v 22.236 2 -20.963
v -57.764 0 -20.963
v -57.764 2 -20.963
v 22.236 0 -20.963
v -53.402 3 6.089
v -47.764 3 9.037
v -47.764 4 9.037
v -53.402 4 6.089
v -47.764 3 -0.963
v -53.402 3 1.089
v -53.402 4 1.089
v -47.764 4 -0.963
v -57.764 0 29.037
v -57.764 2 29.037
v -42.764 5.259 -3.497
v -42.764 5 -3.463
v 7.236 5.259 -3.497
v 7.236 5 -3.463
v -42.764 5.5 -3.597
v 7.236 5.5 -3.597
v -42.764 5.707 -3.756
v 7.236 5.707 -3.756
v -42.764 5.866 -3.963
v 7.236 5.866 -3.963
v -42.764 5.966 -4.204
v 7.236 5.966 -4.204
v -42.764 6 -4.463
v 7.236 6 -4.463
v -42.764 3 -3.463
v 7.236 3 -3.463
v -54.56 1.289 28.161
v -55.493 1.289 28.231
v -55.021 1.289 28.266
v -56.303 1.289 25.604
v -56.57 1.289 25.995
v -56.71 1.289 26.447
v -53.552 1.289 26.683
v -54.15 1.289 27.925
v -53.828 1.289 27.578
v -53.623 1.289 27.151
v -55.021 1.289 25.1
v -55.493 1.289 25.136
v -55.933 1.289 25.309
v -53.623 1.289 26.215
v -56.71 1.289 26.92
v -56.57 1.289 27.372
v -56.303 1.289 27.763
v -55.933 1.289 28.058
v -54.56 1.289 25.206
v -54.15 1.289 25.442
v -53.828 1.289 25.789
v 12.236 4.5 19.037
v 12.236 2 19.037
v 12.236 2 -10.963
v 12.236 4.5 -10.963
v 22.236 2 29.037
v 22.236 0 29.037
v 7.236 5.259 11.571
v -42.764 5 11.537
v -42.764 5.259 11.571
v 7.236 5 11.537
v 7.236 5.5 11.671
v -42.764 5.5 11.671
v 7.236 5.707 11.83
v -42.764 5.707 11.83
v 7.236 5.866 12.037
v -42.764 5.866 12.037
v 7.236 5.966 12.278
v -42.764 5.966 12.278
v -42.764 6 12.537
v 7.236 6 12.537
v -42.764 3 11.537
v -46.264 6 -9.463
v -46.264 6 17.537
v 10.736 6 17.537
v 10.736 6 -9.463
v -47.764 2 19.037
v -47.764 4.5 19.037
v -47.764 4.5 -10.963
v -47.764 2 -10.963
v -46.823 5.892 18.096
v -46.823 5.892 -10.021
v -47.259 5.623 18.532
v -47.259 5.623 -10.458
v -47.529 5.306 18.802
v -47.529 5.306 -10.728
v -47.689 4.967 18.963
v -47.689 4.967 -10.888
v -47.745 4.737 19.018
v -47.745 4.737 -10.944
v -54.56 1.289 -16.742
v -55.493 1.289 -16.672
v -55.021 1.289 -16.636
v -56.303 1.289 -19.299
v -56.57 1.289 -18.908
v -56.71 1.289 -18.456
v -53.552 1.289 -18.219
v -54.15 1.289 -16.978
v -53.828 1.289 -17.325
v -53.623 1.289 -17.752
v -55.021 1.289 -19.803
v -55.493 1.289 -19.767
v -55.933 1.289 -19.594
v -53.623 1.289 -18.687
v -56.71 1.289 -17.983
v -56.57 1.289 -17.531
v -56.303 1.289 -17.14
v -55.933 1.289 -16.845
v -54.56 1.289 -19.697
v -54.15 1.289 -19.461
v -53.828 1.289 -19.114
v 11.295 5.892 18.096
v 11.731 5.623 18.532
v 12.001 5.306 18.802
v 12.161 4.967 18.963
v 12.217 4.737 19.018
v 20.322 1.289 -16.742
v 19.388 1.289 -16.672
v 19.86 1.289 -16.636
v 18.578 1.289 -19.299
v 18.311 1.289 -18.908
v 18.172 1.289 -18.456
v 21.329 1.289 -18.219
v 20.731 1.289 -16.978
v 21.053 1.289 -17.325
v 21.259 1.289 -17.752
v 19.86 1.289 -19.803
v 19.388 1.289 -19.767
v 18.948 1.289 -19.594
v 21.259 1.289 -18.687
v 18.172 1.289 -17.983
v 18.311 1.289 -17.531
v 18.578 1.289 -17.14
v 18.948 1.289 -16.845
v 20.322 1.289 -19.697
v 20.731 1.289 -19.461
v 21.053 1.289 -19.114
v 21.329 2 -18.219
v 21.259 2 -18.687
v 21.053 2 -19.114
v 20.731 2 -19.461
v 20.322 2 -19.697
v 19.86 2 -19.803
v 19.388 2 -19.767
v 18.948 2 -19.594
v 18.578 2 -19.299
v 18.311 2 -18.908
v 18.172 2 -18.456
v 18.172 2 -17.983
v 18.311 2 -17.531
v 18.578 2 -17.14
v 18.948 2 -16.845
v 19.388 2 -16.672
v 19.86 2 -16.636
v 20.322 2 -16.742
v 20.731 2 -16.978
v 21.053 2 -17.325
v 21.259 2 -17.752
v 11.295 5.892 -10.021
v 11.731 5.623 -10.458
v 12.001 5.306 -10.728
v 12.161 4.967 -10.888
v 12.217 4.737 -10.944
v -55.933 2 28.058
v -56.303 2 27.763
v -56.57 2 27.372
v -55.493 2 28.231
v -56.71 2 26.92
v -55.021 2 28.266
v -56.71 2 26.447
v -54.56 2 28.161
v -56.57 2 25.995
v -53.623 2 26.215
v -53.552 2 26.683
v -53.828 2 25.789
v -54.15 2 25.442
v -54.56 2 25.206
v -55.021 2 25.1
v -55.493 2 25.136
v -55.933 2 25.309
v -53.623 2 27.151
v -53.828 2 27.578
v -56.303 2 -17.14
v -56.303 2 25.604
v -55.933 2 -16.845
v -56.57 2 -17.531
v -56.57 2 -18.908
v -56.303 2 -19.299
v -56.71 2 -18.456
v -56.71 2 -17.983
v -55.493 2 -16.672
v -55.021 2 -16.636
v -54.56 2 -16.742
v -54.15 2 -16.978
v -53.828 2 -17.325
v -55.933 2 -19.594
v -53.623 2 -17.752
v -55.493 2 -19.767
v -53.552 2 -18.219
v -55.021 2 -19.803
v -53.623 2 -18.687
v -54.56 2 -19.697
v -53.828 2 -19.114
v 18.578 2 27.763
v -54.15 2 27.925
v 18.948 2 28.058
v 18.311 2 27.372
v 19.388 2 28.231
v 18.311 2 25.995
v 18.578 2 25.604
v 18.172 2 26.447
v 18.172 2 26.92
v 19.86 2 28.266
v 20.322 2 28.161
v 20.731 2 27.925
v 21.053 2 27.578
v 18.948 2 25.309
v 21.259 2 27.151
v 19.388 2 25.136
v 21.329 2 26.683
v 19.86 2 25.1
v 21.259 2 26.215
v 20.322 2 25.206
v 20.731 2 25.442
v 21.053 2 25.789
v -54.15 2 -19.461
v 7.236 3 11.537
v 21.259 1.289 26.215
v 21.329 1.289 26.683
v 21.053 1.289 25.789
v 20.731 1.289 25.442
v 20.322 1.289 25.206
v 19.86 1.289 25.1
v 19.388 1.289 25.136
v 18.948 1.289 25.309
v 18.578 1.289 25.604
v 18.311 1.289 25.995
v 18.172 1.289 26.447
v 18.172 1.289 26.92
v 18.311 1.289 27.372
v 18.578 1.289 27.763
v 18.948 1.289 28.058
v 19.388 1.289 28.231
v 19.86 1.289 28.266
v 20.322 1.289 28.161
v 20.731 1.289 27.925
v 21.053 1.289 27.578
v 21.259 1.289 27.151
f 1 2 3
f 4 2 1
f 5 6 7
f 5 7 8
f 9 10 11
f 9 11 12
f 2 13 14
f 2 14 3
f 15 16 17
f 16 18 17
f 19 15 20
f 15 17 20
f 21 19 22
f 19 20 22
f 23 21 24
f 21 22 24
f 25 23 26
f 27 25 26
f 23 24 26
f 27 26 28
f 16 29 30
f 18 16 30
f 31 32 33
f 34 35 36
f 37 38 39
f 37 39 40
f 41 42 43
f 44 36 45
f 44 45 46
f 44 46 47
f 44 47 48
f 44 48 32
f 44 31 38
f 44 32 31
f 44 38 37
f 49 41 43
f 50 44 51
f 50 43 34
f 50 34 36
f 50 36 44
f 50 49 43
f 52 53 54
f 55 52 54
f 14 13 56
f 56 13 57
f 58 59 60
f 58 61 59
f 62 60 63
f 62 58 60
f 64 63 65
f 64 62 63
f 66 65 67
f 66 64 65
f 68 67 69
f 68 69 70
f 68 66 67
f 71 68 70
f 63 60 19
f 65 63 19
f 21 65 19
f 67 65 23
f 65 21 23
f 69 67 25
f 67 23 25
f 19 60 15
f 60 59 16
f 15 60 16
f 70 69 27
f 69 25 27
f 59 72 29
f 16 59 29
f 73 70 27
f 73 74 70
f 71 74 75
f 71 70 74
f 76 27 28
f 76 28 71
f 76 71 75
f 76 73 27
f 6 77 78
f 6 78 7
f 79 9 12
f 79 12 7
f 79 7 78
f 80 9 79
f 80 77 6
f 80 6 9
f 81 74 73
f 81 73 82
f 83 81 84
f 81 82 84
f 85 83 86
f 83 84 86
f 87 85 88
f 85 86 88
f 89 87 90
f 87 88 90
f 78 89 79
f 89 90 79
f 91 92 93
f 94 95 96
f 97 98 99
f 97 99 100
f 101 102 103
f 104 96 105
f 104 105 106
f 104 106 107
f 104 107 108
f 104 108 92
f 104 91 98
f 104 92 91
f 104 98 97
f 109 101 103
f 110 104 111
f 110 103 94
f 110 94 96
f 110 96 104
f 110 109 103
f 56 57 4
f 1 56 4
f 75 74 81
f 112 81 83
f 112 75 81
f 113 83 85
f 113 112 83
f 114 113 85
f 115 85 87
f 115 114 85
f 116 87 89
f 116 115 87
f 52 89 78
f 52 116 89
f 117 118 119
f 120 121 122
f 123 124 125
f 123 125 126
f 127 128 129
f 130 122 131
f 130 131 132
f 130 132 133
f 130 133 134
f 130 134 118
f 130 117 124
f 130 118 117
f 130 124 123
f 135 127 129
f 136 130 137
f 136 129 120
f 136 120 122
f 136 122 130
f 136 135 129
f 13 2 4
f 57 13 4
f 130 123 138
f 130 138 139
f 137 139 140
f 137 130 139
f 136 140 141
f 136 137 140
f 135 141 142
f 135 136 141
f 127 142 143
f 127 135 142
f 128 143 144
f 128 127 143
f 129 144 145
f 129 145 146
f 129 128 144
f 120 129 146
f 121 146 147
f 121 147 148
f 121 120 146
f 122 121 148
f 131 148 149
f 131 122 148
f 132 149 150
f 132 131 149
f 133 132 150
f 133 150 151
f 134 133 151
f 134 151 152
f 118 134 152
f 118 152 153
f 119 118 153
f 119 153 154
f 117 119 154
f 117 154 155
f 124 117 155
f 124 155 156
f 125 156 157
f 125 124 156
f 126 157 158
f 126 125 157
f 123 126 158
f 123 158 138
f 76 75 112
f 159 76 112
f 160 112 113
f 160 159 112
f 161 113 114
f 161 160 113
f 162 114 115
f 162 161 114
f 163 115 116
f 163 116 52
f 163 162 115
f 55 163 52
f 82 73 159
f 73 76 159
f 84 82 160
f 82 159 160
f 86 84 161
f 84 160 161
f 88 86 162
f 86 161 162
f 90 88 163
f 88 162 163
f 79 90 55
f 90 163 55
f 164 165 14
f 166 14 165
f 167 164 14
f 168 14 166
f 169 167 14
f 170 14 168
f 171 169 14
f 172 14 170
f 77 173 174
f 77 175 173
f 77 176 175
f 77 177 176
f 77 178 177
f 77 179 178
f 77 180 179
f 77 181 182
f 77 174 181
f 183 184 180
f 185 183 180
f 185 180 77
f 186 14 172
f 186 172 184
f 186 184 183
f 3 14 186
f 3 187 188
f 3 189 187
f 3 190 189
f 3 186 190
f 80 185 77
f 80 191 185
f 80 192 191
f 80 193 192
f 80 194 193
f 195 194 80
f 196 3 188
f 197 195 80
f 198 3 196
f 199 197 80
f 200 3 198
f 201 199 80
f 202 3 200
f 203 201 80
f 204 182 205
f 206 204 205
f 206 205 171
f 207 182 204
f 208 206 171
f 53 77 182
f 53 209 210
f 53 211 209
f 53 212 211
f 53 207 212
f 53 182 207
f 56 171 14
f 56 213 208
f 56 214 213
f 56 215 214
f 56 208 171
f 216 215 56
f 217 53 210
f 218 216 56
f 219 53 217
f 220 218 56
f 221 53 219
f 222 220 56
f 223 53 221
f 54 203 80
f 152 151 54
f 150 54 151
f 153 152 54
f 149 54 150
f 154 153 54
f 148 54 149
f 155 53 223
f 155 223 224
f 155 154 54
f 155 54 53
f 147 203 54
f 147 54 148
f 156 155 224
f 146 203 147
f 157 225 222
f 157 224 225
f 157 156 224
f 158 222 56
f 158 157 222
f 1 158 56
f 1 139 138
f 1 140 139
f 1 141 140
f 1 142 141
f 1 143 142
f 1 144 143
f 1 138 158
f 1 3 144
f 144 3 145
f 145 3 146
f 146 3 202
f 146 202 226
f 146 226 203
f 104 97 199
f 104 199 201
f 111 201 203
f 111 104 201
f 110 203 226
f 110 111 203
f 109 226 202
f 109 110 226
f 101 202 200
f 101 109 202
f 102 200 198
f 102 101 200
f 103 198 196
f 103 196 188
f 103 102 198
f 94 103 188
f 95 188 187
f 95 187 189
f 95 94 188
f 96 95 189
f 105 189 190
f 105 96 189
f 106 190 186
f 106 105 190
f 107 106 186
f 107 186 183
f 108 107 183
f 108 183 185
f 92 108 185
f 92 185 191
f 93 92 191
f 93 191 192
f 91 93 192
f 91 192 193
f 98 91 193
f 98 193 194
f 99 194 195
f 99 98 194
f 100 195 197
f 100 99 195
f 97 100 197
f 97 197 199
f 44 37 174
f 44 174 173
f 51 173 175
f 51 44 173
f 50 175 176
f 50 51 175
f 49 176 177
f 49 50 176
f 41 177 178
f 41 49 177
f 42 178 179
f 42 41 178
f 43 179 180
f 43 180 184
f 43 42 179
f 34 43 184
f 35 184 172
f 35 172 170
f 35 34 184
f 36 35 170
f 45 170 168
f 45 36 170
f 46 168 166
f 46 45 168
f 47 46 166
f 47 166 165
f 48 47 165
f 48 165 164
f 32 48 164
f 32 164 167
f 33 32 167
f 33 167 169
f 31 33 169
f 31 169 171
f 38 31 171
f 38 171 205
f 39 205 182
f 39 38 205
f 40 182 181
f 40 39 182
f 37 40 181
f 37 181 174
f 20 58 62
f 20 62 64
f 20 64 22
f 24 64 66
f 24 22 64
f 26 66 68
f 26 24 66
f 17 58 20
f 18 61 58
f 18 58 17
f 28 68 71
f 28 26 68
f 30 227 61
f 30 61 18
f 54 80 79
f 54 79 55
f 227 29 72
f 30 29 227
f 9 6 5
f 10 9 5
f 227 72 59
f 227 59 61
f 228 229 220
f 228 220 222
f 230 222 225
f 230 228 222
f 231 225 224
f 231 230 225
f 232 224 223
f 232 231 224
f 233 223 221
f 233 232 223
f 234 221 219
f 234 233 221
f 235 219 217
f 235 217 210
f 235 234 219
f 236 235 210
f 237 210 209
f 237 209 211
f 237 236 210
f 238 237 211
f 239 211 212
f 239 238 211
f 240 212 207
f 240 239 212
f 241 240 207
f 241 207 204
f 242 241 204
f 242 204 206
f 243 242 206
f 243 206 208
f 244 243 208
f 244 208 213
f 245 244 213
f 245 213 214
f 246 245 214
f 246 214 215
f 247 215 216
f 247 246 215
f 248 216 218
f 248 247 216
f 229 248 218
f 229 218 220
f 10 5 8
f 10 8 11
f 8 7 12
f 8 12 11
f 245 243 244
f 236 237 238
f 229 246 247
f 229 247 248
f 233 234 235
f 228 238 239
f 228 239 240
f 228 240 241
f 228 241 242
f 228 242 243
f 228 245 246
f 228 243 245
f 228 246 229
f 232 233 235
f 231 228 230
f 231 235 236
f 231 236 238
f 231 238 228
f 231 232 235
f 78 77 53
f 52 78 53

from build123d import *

# Parameters (mm, degrees)
SKETCH1_W               = 80
SKETCH1_H               = 50
BOSS_EXTRUDE1_DEPTH     = 2
SKETCH2_W               = 60
SKETCH2_H               = 30
SKETCH2_W_2             = 50
SKETCH2_H_2             = 15
BOSS_EXTRUDE4_DEPTH     = 4
SKETCH3_W               = 50
SKETCH3_H               = 15
BOSS_EXTRUDE5_DEPTH     = 1
BOSS_EXTRUDE6_DEPTH     = 1
FILLET2_R               = 1
FILLET3_R               = 1.5
ADVANCEDHOLE1_START     = 1.2888
ADVANCEDHOLE1_OUTLINE_R = 1.5875
ADVANCEDHOLE1_DEPTH     = 0.7112


# Read off the part's stored shape, not the designer's step: AdvancedHole1
with BuildPart() as part:
    # Sketch1 → Boss-Extrude1 (new body)
    with BuildSketch(Plane(origin=(0, 0, 0), x_dir=(1, 0, 0), z_dir=(0, 1, 0))):
        with Locations((-17.763975155, -4.037267081)):
            Rectangle(SKETCH1_W, SKETCH1_H)
    extrude(amount=BOSS_EXTRUDE1_DEPTH)

    # Sketch2 → Boss-Extrude4 (add)
    with BuildSketch(Plane(origin=(0, 2, 0), x_dir=(1, 0, 0), z_dir=(0, 1, 0))):
        with Locations((-17.763975155, -4.037267081)):
            Rectangle(SKETCH2_W, SKETCH2_H)
        with Locations((-17.763975155, -4.037267081)):
            Rectangle(SKETCH2_W_2, SKETCH2_H_2, mode=Mode.SUBTRACT)
    extrude(amount=BOSS_EXTRUDE4_DEPTH)

    # Sketch3 → Boss-Extrude5 (add)
    with BuildSketch(Plane(origin=(0, 2, 0), x_dir=(1, 0, 0), z_dir=(0, 1, 0))):
        with Locations((-17.763975155, -4.037267081)):
            Rectangle(SKETCH3_W, SKETCH3_H)
    extrude(amount=BOSS_EXTRUDE5_DEPTH)

    # Sketch4 → Boss-Extrude6 (add)
    with BuildSketch(Plane(origin=(0, 3, 0), x_dir=(1, 0, 0), z_dir=(0, 1, 0))):
        Polygon((-47.763975155, 0.962732919), (-47.763975155, -9.037267081), (-53.40213088, -6.089387941), (-53.40213088, -1.089387941), align=None)
    extrude(amount=BOSS_EXTRUDE6_DEPTH)

    # Fillet2
    fillet2_edges = [part.edges().sort_by_distance(p)[0] for p in [
        (-17.763975155, 6, 11.537267081),
        (-17.763975155, 6, -3.462732919),
    ]]
    fillet(fillet2_edges, radius=FILLET2_R)

    # Fillet3
    fillet3_edges = [part.edges().sort_by_distance(p)[0] for p in [
        (-47.763975155, 6, 4.037267081),
        (-17.763975155, 6, 19.037267081),
        (12.236024845, 6, 4.037267081),
        (-17.763975155, 6, -10.962732919),
    ]]
    fillet(fillet3_edges, radius=FILLET3_R)

    # AdvancedHole1 outline → AdvancedHole1 (cut)
    with BuildSketch(Plane(origin=(0, 0, 0), x_dir=(1, 0, 0), z_dir=(0, 1, 0)).offset(ADVANCEDHOLE1_START)):
        with Locations((19.741560812, -26.683343296)):
            Circle(ADVANCEDHOLE1_OUTLINE_R)
        with Locations((-55.139734181, -26.683343296)):
            Circle(ADVANCEDHOLE1_OUTLINE_R)
        with Locations((19.741560812, 18.219478311)):
            Circle(ADVANCEDHOLE1_OUTLINE_R)
        with Locations((-55.139734181, 18.219478311)):
            Circle(ADVANCEDHOLE1_OUTLINE_R)
    extrude(amount=ADVANCEDHOLE1_DEPTH, mode=Mode.SUBTRACT)


solid = part.part
